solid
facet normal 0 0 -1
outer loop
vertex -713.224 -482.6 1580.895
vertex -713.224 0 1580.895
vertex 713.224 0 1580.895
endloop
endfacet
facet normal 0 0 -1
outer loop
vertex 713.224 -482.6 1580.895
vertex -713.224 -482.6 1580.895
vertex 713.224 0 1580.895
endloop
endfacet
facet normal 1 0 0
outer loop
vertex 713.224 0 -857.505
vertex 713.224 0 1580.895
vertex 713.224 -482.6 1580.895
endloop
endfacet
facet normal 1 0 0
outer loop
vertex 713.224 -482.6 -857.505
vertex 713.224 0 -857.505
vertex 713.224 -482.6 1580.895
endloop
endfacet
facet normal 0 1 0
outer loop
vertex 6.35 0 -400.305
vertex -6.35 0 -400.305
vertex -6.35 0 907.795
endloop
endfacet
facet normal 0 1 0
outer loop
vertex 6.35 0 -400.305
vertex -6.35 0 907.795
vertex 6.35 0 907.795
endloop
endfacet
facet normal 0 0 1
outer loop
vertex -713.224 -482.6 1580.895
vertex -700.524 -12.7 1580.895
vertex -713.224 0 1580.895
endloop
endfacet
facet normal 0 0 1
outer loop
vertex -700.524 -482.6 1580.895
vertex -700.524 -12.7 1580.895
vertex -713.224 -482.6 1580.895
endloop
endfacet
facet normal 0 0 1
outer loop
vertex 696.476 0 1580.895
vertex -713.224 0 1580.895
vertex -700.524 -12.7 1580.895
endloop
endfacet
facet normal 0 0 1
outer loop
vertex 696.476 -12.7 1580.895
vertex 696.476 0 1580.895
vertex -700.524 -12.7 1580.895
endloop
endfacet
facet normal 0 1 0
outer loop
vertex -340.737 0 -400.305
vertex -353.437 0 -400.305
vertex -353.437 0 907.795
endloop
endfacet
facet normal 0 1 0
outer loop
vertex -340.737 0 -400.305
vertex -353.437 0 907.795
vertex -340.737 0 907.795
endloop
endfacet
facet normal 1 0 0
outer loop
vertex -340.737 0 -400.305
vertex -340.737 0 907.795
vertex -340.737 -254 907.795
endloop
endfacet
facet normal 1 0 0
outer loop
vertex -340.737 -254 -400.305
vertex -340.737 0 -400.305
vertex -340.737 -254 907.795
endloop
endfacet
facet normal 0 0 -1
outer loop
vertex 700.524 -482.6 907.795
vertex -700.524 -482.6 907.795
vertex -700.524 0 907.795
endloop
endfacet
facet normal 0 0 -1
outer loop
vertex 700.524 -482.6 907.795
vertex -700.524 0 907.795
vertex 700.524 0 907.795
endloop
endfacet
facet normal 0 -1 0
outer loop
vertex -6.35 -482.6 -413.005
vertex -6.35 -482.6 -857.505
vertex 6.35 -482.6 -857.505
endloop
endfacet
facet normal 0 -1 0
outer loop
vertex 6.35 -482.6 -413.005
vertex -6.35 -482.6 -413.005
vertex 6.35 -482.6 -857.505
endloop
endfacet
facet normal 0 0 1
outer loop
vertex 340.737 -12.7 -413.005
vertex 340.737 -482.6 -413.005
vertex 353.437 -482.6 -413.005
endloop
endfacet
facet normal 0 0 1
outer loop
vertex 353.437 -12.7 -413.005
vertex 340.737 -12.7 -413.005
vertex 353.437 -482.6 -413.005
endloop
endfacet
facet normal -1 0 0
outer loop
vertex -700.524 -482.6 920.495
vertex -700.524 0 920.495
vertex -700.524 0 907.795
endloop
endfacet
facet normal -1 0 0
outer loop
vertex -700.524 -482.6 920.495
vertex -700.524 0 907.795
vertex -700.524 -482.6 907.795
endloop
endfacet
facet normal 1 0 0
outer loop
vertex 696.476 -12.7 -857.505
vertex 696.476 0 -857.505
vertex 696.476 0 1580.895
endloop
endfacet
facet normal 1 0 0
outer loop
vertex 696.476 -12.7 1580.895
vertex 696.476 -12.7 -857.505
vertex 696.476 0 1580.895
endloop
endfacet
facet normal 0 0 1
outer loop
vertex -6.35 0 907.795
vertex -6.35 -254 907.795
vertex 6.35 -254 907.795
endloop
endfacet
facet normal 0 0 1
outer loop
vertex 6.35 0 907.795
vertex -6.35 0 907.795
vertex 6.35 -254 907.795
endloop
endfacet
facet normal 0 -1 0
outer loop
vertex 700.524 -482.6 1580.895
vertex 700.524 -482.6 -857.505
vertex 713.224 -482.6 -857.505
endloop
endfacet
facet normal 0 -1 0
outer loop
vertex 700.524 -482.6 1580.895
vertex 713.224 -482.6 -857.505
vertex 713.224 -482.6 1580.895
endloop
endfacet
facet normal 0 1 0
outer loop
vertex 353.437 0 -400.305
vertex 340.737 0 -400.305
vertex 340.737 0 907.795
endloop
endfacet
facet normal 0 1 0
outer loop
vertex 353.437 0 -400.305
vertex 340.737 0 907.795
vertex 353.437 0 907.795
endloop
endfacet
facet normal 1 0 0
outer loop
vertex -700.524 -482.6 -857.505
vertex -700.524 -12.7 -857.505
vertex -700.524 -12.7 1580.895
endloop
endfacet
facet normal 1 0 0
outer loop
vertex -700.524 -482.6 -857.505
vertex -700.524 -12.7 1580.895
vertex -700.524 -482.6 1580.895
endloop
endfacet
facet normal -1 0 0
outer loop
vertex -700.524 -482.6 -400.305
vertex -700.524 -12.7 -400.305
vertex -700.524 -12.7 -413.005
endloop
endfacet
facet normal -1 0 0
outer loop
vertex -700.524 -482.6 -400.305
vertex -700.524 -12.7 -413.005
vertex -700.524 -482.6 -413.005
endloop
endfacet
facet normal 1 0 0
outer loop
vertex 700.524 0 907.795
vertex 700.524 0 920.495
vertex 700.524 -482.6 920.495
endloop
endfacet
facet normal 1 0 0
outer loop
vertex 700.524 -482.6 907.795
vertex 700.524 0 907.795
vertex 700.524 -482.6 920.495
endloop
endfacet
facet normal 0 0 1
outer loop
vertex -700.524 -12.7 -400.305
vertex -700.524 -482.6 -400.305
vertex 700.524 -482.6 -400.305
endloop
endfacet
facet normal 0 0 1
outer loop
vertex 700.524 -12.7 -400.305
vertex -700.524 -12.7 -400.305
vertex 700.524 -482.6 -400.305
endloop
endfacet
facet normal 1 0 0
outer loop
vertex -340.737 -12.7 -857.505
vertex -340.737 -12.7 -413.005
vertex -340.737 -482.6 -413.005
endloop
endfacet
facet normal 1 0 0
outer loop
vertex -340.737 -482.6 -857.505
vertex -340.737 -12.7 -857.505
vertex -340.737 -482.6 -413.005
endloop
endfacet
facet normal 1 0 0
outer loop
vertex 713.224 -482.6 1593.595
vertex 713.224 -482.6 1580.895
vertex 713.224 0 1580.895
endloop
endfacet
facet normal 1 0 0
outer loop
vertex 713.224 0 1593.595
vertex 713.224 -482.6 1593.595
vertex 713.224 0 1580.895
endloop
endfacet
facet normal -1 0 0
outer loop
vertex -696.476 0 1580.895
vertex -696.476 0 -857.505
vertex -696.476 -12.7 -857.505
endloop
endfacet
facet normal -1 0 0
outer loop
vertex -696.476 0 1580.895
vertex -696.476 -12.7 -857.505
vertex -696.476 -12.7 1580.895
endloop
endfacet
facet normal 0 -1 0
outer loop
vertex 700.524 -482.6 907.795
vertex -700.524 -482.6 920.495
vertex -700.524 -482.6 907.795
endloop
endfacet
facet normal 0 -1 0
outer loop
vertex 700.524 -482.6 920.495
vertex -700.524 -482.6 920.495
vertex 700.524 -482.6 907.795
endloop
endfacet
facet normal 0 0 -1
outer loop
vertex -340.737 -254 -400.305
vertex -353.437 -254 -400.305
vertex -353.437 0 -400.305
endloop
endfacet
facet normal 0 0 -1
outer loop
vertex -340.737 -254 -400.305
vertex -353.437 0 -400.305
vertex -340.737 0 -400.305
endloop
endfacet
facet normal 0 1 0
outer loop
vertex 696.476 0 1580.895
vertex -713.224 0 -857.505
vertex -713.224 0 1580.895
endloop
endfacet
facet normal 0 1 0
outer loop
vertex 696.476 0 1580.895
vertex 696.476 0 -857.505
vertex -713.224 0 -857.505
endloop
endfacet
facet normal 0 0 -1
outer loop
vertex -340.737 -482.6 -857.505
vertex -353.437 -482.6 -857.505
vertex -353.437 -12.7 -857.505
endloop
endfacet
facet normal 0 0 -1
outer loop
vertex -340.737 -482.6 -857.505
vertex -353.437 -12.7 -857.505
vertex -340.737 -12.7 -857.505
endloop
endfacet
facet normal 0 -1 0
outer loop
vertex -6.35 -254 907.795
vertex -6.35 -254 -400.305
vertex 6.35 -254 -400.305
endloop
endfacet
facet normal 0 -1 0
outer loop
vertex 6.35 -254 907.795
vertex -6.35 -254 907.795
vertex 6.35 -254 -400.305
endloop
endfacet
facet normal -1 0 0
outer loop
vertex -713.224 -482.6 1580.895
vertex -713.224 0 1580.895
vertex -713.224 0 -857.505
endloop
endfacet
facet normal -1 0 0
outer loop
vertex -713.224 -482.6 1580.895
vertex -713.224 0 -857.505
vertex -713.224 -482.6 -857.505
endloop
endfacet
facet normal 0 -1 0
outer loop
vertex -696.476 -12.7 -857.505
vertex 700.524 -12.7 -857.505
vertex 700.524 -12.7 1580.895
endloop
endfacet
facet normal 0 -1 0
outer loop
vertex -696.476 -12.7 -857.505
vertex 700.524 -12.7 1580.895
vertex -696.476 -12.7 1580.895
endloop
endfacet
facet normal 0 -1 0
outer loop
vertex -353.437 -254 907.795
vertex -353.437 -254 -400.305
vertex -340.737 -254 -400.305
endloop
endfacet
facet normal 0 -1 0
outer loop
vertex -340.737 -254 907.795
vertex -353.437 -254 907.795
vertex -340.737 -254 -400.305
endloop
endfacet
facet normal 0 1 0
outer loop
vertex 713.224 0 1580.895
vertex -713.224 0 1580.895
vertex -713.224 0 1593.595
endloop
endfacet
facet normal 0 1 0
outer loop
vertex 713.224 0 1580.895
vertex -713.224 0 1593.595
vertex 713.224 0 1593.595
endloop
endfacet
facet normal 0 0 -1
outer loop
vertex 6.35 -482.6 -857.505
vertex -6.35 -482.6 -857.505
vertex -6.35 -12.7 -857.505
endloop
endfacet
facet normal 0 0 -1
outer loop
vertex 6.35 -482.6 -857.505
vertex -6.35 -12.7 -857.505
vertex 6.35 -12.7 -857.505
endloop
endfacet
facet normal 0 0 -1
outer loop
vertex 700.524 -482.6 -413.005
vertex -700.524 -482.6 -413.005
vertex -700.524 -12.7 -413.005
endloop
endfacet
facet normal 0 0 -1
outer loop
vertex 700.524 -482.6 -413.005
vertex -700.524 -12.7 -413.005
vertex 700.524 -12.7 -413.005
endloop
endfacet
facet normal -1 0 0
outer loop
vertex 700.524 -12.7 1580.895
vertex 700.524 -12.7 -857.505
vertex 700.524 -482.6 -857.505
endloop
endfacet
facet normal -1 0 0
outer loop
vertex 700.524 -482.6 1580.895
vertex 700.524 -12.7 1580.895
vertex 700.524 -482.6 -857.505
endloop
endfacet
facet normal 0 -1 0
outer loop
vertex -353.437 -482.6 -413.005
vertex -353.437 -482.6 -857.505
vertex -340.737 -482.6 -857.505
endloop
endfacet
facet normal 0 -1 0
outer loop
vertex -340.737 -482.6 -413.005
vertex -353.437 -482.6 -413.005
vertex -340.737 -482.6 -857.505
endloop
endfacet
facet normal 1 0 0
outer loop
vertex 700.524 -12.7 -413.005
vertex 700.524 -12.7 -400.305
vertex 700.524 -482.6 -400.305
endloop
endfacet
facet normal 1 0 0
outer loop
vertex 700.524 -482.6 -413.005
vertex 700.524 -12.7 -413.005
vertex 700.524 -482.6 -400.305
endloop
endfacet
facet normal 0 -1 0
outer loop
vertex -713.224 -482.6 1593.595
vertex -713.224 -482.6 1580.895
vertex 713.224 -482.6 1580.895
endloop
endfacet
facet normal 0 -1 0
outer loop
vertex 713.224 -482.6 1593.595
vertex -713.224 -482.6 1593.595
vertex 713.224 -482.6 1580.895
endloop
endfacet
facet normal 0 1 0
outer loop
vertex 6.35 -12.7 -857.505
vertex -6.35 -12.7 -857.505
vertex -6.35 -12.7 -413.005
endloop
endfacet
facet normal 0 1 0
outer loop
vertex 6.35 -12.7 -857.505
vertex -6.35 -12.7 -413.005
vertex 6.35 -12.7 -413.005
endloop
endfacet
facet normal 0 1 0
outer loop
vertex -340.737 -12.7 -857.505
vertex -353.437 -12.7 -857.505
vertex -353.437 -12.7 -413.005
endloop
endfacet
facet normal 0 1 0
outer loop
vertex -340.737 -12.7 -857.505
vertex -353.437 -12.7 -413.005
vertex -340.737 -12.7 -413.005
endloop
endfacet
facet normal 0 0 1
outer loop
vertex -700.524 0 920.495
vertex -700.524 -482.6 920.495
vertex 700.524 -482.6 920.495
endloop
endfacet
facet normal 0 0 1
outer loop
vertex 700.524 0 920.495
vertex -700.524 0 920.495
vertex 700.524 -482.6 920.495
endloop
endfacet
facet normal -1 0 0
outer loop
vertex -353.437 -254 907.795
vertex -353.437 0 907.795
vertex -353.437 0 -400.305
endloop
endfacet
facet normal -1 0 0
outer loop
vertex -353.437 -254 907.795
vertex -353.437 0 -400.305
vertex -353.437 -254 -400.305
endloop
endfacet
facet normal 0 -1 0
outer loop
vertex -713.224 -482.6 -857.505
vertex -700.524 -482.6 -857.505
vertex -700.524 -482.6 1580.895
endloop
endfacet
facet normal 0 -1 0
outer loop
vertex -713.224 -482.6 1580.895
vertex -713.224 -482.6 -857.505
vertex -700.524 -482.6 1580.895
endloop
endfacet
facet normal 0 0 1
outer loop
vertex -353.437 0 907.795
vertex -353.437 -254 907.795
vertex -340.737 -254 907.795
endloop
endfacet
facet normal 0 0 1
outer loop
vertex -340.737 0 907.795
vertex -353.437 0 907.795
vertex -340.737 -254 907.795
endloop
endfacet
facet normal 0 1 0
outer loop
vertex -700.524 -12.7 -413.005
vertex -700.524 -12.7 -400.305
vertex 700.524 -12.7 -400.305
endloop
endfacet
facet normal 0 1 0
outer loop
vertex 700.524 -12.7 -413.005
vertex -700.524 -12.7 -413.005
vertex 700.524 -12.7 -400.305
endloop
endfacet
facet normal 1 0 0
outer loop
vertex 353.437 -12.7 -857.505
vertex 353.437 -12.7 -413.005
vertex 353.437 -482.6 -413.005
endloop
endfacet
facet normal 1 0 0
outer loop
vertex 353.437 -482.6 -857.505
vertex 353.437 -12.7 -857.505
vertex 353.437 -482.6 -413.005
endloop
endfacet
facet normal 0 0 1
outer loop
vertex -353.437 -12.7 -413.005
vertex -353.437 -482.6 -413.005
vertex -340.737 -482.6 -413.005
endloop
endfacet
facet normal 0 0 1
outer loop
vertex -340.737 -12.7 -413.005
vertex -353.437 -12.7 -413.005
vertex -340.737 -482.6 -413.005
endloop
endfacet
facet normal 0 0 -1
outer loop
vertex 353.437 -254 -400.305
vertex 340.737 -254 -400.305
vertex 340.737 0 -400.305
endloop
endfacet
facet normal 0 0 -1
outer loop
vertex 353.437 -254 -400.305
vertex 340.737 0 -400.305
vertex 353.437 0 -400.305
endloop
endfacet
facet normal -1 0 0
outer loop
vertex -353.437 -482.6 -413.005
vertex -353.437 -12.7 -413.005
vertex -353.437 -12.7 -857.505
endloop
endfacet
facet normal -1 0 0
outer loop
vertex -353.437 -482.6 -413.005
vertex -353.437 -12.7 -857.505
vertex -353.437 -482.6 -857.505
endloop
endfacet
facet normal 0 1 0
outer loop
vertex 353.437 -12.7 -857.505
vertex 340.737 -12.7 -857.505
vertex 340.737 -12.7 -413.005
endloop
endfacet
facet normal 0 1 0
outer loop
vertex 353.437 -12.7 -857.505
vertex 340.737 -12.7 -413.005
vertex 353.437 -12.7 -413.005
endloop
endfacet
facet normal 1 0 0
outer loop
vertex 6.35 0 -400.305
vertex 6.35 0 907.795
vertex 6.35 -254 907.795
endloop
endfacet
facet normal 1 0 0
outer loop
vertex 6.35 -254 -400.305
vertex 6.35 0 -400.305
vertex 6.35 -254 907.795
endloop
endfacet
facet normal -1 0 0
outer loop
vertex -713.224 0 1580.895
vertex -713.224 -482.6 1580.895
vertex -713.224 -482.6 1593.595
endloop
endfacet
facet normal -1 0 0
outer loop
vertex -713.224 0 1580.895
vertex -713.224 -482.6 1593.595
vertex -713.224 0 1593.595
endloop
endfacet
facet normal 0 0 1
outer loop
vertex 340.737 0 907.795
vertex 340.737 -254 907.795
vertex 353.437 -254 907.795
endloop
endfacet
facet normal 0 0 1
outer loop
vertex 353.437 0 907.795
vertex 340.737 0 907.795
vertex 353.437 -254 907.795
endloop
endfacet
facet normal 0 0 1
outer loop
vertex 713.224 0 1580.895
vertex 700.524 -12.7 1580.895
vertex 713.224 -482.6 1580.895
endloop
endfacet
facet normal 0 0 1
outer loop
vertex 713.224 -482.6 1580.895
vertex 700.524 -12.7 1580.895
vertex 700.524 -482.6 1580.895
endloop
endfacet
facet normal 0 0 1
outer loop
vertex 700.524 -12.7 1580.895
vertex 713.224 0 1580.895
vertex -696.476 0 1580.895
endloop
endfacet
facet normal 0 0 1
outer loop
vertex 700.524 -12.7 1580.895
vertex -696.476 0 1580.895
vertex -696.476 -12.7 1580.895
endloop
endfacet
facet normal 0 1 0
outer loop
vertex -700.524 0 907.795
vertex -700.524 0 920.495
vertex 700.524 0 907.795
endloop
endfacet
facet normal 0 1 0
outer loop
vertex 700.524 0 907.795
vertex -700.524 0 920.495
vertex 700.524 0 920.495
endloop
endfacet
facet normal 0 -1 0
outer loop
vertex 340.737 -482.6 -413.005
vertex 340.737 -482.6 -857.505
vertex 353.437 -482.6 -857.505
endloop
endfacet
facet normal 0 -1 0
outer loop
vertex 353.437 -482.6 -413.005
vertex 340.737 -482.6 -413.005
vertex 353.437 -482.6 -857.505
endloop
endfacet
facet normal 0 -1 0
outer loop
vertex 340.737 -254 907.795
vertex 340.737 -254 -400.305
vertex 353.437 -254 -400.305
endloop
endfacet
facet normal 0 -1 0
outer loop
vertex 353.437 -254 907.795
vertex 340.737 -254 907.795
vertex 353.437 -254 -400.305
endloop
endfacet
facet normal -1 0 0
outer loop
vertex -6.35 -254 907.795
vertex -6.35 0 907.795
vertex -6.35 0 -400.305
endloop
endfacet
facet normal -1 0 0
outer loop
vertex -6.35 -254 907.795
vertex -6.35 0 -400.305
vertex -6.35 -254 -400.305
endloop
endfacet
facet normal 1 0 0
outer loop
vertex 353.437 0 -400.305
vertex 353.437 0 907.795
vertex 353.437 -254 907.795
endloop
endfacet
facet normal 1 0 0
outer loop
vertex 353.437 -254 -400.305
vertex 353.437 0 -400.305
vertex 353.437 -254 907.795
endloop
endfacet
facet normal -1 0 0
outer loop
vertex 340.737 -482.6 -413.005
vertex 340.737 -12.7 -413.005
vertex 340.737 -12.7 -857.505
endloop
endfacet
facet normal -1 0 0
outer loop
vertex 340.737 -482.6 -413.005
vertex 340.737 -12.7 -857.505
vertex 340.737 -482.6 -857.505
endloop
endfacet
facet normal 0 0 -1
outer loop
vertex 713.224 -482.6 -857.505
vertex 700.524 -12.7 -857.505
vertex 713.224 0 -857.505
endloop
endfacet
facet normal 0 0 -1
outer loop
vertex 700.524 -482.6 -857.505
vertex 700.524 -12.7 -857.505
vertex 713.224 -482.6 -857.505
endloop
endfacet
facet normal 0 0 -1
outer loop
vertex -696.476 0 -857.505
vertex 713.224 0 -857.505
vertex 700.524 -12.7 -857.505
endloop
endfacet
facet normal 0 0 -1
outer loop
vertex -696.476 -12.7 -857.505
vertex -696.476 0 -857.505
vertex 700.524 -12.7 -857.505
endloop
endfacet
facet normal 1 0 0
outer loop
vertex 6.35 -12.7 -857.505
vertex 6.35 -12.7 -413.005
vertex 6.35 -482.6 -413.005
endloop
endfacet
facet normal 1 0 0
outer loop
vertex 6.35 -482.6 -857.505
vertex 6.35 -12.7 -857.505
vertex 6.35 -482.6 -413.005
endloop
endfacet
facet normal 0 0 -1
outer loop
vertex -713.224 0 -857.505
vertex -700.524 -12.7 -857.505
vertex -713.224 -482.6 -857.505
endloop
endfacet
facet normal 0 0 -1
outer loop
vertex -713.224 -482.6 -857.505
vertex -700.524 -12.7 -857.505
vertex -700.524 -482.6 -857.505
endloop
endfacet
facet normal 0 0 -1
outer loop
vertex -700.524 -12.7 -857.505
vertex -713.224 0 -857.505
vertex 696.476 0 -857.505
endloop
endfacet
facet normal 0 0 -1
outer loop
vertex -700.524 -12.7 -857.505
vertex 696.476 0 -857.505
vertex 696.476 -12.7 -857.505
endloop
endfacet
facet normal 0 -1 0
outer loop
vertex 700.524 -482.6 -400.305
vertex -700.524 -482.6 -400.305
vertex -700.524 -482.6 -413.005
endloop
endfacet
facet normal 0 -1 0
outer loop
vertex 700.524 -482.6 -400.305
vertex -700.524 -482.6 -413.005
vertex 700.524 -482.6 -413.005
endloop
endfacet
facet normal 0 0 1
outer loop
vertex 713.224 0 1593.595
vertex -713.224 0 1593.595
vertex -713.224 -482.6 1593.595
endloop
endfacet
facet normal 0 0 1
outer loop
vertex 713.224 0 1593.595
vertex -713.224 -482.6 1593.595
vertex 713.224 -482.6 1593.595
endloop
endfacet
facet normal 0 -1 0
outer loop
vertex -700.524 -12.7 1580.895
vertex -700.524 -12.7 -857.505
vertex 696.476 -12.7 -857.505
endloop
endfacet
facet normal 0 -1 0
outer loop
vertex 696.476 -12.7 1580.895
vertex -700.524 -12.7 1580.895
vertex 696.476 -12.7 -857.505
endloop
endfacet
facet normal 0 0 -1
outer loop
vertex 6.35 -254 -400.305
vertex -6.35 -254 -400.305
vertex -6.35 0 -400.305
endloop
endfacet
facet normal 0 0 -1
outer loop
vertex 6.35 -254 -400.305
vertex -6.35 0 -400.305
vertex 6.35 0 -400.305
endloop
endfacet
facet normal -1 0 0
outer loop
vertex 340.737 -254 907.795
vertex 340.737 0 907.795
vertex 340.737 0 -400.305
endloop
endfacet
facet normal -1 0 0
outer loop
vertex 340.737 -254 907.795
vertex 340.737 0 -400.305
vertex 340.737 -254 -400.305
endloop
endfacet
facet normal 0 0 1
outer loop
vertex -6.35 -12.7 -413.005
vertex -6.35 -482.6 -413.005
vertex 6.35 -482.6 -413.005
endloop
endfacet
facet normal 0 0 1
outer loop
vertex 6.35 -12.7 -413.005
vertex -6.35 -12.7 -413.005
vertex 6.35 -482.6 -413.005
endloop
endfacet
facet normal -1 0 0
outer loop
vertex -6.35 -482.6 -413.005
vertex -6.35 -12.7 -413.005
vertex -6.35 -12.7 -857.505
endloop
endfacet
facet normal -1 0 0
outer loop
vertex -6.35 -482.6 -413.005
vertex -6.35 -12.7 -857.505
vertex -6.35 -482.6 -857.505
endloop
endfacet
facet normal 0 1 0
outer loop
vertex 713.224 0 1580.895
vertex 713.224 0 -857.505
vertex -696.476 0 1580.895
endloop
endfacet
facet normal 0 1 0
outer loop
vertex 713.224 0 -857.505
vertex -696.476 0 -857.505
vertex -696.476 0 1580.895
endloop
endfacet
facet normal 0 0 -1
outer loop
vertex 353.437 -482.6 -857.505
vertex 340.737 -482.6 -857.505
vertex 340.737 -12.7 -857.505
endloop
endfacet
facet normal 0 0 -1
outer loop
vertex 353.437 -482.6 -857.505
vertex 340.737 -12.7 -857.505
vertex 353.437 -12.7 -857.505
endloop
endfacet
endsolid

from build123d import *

# Parameters (mm, degrees)
F0_W      = 1397
F0_H      = 2438.4
F1_DEPTH  = 12.7
F2_W      = 482.6
F2_H      = 2438.4
F3_DEPTH  = 12.7
F5_W      = 1426.4482096374
F5_H      = 482.6
F6_DEPTH  = 12.7
F8_W      = 1401.0482096374
F8_H      = 469.9
F9_DEPTH  = 12.7
F11_W     = 1401.0482096374
F11_H     = 482.6
F12_DEPTH = 12.7
F13_W     = 12.7
F13_H     = 254
F14_DEPTH = 1308.1
F15_W     = 12.7
F15_H     = 469.9
F16_DEPTH = 444.5


with BuildPart() as f1:
    # F0 (on Front) → F1 (new body)
    with BuildSketch(Plane.XZ):
        with Locations((-2.0241048187, 361.6945657248)):
            Rectangle(F0_W, F0_H)
    extrude(amount=F1_DEPTH)

    # F2 (on face) → F3 (join)
    with BuildSketch(Plane(origin=(-700.5241048187, 0, 0), x_dir=(0, -1, 0), z_dir=(-1, 0, 0))):
        with Locations((241.3, 361.6945657248)):
            Rectangle(F2_W, F2_H)
    extrude(amount=F3_DEPTH)


with BuildPart() as f4_1:
    # F4: instance of F1
    add(f1.part.mirror(Plane.YZ))


with BuildPart() as f6:
    # F5 (on face) → F6 (new body)
    with BuildSketch(Plane.XY.offset(1580.8945657248)):
        with Locations((0, -241.3)):
            Rectangle(F5_W, F5_H)
    extrude(amount=F6_DEPTH)


with BuildPart() as f9:
    # F8 (on offset) → F9 (new body)
    with BuildSketch(Plane(origin=(0, 0, -400.3054342752), x_dir=(1, 0, 0), z_dir=(0, 0, -1))):
        with Locations((0, 247.65)):
            Rectangle(F8_W, F8_H)
    extrude(amount=F9_DEPTH)


with BuildPart() as f12:
    # F11 (on offset) → F12 (new body)
    with BuildSketch(Plane(origin=(0, 0, 920.4945657248), x_dir=(1, 0, 0), z_dir=(0, 0, -1))):
        with Locations((0, 241.3)):
            Rectangle(F11_W, F11_H)
    extrude(amount=F12_DEPTH)


with BuildPart() as f14:
    # F13 (on face) → F14 (new body, through all)
    with BuildSketch(Plane(origin=(0, 0, 907.7945657248), x_dir=(1, 0, 0), z_dir=(0, 0, -1))):
        with Locations((-347.0870524094, 127)):
            Rectangle(F13_W, F13_H)
    extrude(amount=F14_DEPTH)


with BuildPart() as f14b:
    # F13 (on face) → F14, piece 2 (new body, through all)
    with BuildSketch(Plane(origin=(0, 0, 907.7945657248), x_dir=(1, 0, 0), z_dir=(0, 0, -1))):
        with Locations((0, 127)):
            Rectangle(F13_W, F13_H)
    extrude(amount=F14_DEPTH)


with BuildPart() as f14c:
    # F13 (on face) → F14, piece 3 (new body, through all)
    with BuildSketch(Plane(origin=(0, 0, 907.7945657248), x_dir=(1, 0, 0), z_dir=(0, 0, -1))):
        with Locations((347.0870524094, 127)):
            Rectangle(F13_W, F13_H)
    extrude(amount=F14_DEPTH)


with BuildPart() as f16:
    # F15 (on face) → F16 (new body, through all)
    with BuildSketch(Plane(origin=(0, 0, -413.0054342752), x_dir=(1, 0, 0), z_dir=(0, 0, -1))):
        with Locations((-347.0870524094, 247.65)):
            Rectangle(F15_W, F15_H)
    extrude(amount=F16_DEPTH)


with BuildPart() as f16b:
    # F15 (on face) → F16, piece 2 (new body, through all)
    with BuildSketch(Plane(origin=(0, 0, -413.0054342752), x_dir=(1, 0, 0), z_dir=(0, 0, -1))):
        with Locations((0, 247.65)):
            Rectangle(F15_W, F15_H)
    extrude(amount=F16_DEPTH)


with BuildPart() as f16c:
    # F15 (on face) → F16, piece 3 (new body, through all)
    with BuildSketch(Plane(origin=(0, 0, -413.0054342752), x_dir=(1, 0, 0), z_dir=(0, 0, -1))):
        with Locations((347.0870524094, 247.65)):
            Rectangle(F15_W, F15_H)
    extrude(amount=F16_DEPTH)


solid = Compound([f1.part, f4_1.part, f6.part, f9.part, f12.part, f14.part, f14b.part, f14c.part, f16.part, f16b.part, f16c.part])
